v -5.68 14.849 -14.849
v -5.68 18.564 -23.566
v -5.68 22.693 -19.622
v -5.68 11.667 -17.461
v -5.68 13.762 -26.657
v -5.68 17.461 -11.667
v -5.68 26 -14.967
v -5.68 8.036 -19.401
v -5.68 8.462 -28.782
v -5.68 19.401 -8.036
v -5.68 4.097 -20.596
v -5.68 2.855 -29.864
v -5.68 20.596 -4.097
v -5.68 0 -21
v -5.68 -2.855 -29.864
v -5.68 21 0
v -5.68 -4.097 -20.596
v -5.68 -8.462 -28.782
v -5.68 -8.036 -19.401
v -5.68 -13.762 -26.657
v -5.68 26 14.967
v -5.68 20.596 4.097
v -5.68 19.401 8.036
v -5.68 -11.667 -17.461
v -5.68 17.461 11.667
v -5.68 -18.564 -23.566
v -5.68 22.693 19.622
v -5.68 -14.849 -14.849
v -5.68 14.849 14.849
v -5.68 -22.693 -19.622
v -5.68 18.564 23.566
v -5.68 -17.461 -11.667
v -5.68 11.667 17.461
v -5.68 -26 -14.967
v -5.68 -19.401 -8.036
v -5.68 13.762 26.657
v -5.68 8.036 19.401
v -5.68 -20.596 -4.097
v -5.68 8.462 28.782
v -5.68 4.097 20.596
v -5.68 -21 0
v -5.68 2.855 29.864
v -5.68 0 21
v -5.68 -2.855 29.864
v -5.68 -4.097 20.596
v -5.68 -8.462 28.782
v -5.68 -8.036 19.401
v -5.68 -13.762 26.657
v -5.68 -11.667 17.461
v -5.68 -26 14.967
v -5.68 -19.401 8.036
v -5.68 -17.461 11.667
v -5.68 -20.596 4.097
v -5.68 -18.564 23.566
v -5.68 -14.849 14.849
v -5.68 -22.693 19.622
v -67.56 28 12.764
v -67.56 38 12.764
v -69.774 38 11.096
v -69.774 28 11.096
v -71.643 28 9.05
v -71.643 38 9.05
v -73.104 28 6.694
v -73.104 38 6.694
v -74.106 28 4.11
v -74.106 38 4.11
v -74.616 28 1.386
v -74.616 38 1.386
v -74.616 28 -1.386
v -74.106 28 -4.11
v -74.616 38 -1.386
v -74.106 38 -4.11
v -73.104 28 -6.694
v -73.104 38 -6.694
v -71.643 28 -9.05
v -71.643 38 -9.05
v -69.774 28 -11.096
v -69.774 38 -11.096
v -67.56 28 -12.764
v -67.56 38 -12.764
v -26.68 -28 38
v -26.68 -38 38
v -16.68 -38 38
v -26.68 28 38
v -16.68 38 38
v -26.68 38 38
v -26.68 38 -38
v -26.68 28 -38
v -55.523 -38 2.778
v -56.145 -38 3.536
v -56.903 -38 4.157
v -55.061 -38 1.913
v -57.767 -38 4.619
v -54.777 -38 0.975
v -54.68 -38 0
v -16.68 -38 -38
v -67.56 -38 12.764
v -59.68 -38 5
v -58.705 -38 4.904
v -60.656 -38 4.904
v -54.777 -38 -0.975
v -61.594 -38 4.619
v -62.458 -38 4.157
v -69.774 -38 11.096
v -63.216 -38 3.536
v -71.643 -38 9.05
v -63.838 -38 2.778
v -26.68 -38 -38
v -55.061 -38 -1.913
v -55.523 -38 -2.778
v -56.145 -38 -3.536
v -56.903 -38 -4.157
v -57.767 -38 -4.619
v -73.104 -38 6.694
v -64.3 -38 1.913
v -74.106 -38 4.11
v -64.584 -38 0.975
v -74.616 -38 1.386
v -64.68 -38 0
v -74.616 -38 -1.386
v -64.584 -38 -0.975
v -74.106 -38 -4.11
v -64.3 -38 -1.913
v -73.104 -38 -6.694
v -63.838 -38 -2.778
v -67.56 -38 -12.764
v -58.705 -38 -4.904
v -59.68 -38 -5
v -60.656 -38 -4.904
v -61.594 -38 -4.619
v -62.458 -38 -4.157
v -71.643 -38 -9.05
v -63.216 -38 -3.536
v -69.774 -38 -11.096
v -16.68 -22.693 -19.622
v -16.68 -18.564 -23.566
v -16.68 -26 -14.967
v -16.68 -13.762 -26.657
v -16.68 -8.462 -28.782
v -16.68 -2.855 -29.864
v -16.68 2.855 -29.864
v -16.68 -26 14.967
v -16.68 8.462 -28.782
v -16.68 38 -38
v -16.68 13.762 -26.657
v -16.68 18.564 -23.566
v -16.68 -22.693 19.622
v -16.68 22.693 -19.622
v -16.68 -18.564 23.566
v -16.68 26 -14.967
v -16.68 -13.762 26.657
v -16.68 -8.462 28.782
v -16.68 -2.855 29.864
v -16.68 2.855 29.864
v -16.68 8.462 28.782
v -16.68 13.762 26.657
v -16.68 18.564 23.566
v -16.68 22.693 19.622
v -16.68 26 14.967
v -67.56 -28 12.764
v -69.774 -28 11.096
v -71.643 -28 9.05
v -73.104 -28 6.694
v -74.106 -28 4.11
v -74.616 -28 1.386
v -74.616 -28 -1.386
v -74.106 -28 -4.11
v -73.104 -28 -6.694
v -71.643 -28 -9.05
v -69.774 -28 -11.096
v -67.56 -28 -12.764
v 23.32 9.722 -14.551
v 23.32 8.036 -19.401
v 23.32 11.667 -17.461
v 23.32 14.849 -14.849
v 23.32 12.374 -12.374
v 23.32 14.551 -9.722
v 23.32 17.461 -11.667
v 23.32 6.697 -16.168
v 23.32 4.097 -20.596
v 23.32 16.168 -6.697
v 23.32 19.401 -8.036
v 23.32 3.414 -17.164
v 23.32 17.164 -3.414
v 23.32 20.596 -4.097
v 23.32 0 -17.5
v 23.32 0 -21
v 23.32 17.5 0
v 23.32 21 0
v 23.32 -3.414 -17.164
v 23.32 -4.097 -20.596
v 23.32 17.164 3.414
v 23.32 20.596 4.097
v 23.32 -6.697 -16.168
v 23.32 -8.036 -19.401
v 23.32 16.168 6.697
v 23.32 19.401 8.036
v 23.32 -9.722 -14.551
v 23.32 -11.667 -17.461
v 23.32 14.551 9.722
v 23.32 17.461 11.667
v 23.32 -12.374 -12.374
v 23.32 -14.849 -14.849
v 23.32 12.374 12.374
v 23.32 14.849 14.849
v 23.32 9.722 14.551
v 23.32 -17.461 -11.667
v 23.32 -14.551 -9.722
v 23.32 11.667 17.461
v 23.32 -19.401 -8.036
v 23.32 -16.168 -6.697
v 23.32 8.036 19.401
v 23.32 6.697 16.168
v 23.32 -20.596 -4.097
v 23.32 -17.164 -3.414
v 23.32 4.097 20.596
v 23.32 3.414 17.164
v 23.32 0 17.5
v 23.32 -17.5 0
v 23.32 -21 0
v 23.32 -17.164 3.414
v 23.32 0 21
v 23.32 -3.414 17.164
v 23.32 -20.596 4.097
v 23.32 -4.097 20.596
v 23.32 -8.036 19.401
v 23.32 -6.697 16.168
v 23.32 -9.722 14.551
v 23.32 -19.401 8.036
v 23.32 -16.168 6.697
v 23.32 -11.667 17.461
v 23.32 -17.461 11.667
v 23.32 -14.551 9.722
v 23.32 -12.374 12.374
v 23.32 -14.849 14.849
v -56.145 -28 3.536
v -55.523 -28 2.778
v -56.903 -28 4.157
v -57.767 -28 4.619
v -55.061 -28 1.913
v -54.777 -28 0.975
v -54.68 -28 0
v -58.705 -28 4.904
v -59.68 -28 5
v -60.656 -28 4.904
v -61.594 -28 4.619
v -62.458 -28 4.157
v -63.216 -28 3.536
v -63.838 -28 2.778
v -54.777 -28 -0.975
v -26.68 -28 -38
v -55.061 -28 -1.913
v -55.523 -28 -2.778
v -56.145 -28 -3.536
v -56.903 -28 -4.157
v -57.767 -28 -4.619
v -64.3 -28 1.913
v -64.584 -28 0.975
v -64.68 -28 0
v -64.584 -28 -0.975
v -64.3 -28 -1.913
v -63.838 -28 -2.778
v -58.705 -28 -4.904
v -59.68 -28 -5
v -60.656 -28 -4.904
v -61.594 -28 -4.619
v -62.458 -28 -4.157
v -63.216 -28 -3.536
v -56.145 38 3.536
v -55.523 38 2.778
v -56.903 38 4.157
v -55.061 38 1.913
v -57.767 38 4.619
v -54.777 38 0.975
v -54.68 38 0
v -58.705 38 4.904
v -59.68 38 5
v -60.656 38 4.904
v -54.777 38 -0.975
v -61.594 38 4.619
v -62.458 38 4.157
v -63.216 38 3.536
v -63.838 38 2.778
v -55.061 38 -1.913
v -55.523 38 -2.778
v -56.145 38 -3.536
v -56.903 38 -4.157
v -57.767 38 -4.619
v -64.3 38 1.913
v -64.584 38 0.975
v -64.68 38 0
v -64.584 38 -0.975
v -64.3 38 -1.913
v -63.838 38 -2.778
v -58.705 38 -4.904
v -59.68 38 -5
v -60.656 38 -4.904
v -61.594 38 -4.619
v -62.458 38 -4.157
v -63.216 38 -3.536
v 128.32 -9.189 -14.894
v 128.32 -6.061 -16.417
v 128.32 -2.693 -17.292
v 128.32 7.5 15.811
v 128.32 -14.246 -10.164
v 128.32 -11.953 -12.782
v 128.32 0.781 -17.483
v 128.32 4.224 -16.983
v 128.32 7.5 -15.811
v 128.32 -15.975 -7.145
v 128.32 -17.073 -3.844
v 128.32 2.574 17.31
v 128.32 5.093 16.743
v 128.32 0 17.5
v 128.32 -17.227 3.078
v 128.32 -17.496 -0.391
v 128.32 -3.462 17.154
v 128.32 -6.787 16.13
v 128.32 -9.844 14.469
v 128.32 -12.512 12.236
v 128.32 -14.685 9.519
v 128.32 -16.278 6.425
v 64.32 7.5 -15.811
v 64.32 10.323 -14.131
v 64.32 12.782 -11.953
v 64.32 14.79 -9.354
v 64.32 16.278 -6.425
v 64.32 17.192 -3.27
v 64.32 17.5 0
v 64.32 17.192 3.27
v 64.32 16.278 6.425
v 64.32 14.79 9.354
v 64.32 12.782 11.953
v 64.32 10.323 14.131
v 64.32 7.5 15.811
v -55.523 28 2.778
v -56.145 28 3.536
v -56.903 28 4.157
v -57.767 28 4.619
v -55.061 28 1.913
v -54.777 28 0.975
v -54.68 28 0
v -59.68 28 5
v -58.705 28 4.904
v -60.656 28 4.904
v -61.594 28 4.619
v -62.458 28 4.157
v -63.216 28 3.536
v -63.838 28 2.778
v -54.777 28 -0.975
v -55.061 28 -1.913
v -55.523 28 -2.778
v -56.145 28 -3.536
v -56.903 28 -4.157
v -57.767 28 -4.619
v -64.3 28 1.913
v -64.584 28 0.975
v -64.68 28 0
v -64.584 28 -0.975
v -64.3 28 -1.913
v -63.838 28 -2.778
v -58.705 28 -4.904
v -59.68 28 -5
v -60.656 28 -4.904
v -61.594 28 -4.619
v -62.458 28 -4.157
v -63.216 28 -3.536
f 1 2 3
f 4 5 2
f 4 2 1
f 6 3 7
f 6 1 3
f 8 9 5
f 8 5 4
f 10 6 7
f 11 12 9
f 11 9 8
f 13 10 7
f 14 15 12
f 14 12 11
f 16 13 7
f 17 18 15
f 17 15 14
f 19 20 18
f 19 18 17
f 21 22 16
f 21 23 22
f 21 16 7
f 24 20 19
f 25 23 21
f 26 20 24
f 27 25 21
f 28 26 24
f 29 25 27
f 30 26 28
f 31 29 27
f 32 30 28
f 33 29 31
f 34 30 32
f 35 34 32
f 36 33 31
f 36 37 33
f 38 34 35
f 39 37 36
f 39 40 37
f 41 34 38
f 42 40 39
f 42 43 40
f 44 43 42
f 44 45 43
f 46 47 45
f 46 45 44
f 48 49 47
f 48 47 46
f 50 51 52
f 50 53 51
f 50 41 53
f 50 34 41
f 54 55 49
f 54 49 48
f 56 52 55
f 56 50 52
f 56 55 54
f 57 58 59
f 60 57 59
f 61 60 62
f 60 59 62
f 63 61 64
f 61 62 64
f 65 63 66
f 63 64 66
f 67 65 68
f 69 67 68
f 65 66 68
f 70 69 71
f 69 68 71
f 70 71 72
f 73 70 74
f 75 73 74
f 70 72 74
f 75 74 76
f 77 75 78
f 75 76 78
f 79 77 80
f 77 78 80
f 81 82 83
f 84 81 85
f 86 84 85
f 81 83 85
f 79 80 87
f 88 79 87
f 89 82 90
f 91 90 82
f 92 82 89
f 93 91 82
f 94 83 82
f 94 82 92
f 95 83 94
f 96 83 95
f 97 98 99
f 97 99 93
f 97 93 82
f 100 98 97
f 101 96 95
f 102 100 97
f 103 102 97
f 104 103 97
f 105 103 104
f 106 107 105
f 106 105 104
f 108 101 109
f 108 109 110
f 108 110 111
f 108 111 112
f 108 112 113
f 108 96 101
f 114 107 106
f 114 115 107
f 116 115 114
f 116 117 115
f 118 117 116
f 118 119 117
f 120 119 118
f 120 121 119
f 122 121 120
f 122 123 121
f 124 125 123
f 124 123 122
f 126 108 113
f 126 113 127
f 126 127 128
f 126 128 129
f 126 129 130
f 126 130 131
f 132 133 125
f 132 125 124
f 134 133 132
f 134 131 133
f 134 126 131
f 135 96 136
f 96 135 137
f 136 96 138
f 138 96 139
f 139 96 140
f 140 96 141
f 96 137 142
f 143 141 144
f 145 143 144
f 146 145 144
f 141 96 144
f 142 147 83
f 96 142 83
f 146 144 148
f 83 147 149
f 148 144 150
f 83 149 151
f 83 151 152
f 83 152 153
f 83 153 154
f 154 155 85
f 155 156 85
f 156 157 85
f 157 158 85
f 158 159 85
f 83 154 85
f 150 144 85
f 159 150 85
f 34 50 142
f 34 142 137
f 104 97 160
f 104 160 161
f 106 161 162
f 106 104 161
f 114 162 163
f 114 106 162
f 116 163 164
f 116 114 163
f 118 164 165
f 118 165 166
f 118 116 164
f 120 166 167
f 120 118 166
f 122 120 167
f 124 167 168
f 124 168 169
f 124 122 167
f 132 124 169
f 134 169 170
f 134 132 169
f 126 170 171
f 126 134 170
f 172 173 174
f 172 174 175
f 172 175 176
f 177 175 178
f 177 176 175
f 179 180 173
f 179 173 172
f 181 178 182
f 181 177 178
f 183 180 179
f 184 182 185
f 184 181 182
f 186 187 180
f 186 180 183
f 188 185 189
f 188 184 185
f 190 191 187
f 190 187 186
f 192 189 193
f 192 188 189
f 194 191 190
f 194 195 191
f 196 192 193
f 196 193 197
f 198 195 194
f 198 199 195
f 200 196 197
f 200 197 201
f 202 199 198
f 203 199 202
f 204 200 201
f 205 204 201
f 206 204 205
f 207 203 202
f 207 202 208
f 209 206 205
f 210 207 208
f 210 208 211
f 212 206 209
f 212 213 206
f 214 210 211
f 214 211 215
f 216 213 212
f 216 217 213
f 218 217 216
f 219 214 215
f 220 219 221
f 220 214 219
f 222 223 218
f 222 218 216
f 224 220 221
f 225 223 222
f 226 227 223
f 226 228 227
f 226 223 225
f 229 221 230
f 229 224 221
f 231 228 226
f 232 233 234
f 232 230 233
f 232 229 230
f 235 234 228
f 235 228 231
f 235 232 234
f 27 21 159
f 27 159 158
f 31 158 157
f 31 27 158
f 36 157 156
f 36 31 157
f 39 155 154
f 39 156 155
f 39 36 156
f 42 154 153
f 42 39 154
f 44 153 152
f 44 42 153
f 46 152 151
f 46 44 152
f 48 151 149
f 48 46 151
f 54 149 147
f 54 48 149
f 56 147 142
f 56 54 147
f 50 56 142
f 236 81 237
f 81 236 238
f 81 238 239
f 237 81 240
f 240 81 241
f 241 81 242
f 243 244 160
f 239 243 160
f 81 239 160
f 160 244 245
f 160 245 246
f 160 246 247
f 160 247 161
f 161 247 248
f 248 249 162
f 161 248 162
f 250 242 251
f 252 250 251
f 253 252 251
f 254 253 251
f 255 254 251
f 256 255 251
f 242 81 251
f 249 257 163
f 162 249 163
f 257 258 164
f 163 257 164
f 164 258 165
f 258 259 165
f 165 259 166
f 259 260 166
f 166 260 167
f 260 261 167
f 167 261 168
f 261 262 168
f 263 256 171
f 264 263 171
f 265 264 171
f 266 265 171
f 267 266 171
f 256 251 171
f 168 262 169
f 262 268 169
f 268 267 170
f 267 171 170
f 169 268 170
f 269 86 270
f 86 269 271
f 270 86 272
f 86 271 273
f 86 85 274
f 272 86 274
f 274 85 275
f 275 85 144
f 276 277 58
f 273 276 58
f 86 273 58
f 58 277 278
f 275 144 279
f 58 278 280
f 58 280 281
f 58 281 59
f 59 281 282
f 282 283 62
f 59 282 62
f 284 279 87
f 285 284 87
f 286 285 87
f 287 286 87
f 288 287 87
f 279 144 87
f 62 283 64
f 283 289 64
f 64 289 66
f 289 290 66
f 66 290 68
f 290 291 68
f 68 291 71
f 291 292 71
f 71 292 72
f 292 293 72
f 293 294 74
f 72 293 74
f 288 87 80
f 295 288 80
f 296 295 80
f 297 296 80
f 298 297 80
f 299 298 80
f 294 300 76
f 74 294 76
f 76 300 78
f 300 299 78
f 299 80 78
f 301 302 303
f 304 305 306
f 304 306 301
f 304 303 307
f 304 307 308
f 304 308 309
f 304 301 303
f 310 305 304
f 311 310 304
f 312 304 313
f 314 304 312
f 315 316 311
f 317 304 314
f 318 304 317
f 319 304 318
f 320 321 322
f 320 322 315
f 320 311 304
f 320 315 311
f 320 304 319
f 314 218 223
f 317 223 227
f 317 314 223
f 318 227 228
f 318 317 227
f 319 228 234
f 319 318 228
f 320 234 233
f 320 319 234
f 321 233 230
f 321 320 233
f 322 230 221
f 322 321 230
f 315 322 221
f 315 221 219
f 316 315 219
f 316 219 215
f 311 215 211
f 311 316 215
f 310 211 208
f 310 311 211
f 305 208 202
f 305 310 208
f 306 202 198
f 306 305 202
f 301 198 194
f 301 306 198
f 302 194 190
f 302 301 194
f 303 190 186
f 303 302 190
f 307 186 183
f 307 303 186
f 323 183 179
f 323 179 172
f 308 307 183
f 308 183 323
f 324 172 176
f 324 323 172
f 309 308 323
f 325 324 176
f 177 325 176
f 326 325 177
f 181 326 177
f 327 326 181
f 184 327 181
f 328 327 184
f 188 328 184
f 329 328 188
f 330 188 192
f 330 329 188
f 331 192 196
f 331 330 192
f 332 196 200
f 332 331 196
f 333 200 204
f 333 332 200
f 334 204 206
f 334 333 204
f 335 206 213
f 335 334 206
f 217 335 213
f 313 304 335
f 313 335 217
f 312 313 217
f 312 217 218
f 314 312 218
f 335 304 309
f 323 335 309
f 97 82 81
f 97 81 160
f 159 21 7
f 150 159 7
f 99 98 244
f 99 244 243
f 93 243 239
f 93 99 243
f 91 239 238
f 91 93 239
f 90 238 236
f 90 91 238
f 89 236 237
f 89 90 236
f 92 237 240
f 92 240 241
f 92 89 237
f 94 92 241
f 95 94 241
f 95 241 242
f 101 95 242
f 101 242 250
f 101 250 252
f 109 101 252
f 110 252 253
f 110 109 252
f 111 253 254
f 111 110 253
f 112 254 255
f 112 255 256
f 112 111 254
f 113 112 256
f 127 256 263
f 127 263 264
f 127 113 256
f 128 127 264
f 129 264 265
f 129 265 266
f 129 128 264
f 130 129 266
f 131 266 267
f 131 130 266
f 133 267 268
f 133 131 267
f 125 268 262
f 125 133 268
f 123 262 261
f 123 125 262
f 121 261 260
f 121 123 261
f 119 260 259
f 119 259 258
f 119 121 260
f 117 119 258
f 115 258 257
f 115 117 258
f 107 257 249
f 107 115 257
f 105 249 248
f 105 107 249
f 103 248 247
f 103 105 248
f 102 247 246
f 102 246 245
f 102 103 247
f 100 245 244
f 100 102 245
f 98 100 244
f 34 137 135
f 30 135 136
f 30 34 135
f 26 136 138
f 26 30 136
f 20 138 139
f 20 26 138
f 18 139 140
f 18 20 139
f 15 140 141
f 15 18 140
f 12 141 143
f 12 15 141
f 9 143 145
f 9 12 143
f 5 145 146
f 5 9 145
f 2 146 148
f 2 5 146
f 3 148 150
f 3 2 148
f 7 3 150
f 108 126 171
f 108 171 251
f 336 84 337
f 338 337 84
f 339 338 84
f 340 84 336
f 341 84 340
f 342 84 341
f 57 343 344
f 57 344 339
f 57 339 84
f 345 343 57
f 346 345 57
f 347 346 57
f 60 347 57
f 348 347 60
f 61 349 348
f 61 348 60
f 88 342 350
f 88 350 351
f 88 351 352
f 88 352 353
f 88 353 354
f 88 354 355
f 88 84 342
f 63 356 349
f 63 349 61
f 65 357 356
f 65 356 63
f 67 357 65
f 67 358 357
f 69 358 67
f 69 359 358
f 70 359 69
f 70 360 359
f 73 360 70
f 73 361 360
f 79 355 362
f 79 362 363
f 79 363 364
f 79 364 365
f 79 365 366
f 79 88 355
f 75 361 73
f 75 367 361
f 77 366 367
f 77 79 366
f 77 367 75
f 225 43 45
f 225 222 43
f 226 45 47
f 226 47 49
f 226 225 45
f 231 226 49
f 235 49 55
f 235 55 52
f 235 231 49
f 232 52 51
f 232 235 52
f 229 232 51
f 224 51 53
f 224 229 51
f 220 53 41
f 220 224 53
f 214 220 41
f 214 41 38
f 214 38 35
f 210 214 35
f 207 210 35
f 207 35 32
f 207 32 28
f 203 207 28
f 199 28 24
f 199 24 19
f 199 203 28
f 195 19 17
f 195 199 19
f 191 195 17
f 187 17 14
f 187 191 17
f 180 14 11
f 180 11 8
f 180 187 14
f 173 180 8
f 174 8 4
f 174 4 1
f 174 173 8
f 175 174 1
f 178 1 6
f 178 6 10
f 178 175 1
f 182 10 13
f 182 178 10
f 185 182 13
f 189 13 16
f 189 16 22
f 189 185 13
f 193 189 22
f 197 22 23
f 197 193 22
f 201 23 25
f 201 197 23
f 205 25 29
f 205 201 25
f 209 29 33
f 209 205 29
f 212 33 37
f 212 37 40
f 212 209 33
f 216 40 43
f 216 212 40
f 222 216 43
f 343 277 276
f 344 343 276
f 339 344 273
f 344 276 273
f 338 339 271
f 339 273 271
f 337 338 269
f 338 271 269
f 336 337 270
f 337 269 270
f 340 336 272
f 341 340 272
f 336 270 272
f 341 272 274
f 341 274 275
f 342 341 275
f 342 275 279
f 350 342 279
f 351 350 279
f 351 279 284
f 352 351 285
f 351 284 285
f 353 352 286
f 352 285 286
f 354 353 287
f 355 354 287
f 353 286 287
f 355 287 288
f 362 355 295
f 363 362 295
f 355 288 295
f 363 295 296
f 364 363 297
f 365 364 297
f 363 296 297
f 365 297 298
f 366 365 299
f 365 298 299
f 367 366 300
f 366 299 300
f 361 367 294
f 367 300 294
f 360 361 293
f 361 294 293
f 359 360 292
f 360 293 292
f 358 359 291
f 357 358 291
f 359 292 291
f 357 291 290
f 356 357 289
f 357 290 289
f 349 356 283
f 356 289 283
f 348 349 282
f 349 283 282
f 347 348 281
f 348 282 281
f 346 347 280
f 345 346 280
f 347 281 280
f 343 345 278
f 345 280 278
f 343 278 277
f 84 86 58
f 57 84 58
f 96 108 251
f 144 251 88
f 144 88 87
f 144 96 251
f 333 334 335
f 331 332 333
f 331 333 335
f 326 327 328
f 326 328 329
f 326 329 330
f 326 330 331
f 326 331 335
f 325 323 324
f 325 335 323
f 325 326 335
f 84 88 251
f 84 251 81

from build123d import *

# Parameters (mm, degrees)
SKETCH_2_W          = 53.579793819
SKETCH_2_H          = 11.740278351
CUT_EXTRUDE_1_DEPTH = 64
SKETCH_3_W          = 57.586414551
SKETCH_3_H          = 11.064638604
SKETCH_3_W_2        = 48.61735144
SKETCH_3_H_2        = 9.555824249
CUT_EXTRUDE_2_DEPTH = 64
SKETCH_4_W          = 76
SKETCH_4_H          = 76
EXTRUDE_1_DEPTH     = 10
SKETCH_5_R          = 5
EXTRUDE_2_DEPTH     = 10


with BuildPart() as part:
    # 스케치1 → 회전1 (revolve)
    with BuildSketch(Plane.XY, mode=Mode.PRIVATE) as revolve_1_sk:
        Polygon((-16.680473815, 0), (-16.680473815, 30), (-5.680473815, 30), (-5.680473815, 21), (23.319526185, 21), (23.319526185, 17.5), (128.319526185, 17.5), (128.319526185, 0), align=None)
    revolve(revolve_1_sk.sketch.rotate(Axis((-16.680473815, 0, 0), (1, 0, 0)), 90), axis=Axis((-16.680473815, 0, 0), (1, 0, 0)))

    # 스케치2 → 컷-돌출1 (cut)
    with BuildSketch(Plane(origin=(128.319526185, 0, 0), x_dir=(0, 0, -1), z_dir=(1, 0, 0))):
        with Locations((8.115762888, 13.370139176)):
            Rectangle(SKETCH_2_W, SKETCH_2_H)
    extrude(amount=-CUT_EXTRUDE_1_DEPTH, mode=Mode.SUBTRACT)

    # 스케치3 → 컷-돌출2 (cut)
    with BuildSketch(Plane(origin=(-5.680473815, 0, 0), x_dir=(0, 0, -1), z_dir=(1, 0, 0))):
        with Locations((-0.377203588, 31.532319302)):
            Rectangle(SKETCH_3_W, SKETCH_3_H)
        with Locations((-1.173522276, -30.777912125)):
            Rectangle(SKETCH_3_W_2, SKETCH_3_H_2)
    extrude(amount=-CUT_EXTRUDE_2_DEPTH, mode=Mode.SUBTRACT)

    # 스케치4 → 보스-돌출1 (add)
    with BuildSketch(Plane.ZY.offset(16.680473815)):
        Rectangle(SKETCH_4_W, SKETCH_4_H)
    extrude(amount=EXTRUDE_1_DEPTH)

    # 스케치5 → 보스-돌출2 (add)
    with BuildSketch(Plane(origin=(0, 38, 0), x_dir=(1, 0, 0), z_dir=(0, 1, 0))):
        with BuildLine():
            ThreePointArc((-67.559960472, -12.763764728), (-74.680473815, 0), (-67.559960472, 12.763764728))
            Line((-67.559960472, 12.763764728), (-26.680473815, 38))
            Line((-26.680473815, 38), (-26.680473815, -38))
            Line((-26.680473815, -38), (-67.559960472, -12.763764728))
        make_face()
        with Locations(Location((-59.680473815, 0, 0), (0, 0, 270))):
            Circle(SKETCH_5_R, mode=Mode.SUBTRACT)
    extrude_2 = extrude(amount=-EXTRUDE_2_DEPTH)

    # 대칭 복사1: 보스-돌출2 across plane
    add(extrude_2.mirror(Plane.ZX))


solid = part.part
